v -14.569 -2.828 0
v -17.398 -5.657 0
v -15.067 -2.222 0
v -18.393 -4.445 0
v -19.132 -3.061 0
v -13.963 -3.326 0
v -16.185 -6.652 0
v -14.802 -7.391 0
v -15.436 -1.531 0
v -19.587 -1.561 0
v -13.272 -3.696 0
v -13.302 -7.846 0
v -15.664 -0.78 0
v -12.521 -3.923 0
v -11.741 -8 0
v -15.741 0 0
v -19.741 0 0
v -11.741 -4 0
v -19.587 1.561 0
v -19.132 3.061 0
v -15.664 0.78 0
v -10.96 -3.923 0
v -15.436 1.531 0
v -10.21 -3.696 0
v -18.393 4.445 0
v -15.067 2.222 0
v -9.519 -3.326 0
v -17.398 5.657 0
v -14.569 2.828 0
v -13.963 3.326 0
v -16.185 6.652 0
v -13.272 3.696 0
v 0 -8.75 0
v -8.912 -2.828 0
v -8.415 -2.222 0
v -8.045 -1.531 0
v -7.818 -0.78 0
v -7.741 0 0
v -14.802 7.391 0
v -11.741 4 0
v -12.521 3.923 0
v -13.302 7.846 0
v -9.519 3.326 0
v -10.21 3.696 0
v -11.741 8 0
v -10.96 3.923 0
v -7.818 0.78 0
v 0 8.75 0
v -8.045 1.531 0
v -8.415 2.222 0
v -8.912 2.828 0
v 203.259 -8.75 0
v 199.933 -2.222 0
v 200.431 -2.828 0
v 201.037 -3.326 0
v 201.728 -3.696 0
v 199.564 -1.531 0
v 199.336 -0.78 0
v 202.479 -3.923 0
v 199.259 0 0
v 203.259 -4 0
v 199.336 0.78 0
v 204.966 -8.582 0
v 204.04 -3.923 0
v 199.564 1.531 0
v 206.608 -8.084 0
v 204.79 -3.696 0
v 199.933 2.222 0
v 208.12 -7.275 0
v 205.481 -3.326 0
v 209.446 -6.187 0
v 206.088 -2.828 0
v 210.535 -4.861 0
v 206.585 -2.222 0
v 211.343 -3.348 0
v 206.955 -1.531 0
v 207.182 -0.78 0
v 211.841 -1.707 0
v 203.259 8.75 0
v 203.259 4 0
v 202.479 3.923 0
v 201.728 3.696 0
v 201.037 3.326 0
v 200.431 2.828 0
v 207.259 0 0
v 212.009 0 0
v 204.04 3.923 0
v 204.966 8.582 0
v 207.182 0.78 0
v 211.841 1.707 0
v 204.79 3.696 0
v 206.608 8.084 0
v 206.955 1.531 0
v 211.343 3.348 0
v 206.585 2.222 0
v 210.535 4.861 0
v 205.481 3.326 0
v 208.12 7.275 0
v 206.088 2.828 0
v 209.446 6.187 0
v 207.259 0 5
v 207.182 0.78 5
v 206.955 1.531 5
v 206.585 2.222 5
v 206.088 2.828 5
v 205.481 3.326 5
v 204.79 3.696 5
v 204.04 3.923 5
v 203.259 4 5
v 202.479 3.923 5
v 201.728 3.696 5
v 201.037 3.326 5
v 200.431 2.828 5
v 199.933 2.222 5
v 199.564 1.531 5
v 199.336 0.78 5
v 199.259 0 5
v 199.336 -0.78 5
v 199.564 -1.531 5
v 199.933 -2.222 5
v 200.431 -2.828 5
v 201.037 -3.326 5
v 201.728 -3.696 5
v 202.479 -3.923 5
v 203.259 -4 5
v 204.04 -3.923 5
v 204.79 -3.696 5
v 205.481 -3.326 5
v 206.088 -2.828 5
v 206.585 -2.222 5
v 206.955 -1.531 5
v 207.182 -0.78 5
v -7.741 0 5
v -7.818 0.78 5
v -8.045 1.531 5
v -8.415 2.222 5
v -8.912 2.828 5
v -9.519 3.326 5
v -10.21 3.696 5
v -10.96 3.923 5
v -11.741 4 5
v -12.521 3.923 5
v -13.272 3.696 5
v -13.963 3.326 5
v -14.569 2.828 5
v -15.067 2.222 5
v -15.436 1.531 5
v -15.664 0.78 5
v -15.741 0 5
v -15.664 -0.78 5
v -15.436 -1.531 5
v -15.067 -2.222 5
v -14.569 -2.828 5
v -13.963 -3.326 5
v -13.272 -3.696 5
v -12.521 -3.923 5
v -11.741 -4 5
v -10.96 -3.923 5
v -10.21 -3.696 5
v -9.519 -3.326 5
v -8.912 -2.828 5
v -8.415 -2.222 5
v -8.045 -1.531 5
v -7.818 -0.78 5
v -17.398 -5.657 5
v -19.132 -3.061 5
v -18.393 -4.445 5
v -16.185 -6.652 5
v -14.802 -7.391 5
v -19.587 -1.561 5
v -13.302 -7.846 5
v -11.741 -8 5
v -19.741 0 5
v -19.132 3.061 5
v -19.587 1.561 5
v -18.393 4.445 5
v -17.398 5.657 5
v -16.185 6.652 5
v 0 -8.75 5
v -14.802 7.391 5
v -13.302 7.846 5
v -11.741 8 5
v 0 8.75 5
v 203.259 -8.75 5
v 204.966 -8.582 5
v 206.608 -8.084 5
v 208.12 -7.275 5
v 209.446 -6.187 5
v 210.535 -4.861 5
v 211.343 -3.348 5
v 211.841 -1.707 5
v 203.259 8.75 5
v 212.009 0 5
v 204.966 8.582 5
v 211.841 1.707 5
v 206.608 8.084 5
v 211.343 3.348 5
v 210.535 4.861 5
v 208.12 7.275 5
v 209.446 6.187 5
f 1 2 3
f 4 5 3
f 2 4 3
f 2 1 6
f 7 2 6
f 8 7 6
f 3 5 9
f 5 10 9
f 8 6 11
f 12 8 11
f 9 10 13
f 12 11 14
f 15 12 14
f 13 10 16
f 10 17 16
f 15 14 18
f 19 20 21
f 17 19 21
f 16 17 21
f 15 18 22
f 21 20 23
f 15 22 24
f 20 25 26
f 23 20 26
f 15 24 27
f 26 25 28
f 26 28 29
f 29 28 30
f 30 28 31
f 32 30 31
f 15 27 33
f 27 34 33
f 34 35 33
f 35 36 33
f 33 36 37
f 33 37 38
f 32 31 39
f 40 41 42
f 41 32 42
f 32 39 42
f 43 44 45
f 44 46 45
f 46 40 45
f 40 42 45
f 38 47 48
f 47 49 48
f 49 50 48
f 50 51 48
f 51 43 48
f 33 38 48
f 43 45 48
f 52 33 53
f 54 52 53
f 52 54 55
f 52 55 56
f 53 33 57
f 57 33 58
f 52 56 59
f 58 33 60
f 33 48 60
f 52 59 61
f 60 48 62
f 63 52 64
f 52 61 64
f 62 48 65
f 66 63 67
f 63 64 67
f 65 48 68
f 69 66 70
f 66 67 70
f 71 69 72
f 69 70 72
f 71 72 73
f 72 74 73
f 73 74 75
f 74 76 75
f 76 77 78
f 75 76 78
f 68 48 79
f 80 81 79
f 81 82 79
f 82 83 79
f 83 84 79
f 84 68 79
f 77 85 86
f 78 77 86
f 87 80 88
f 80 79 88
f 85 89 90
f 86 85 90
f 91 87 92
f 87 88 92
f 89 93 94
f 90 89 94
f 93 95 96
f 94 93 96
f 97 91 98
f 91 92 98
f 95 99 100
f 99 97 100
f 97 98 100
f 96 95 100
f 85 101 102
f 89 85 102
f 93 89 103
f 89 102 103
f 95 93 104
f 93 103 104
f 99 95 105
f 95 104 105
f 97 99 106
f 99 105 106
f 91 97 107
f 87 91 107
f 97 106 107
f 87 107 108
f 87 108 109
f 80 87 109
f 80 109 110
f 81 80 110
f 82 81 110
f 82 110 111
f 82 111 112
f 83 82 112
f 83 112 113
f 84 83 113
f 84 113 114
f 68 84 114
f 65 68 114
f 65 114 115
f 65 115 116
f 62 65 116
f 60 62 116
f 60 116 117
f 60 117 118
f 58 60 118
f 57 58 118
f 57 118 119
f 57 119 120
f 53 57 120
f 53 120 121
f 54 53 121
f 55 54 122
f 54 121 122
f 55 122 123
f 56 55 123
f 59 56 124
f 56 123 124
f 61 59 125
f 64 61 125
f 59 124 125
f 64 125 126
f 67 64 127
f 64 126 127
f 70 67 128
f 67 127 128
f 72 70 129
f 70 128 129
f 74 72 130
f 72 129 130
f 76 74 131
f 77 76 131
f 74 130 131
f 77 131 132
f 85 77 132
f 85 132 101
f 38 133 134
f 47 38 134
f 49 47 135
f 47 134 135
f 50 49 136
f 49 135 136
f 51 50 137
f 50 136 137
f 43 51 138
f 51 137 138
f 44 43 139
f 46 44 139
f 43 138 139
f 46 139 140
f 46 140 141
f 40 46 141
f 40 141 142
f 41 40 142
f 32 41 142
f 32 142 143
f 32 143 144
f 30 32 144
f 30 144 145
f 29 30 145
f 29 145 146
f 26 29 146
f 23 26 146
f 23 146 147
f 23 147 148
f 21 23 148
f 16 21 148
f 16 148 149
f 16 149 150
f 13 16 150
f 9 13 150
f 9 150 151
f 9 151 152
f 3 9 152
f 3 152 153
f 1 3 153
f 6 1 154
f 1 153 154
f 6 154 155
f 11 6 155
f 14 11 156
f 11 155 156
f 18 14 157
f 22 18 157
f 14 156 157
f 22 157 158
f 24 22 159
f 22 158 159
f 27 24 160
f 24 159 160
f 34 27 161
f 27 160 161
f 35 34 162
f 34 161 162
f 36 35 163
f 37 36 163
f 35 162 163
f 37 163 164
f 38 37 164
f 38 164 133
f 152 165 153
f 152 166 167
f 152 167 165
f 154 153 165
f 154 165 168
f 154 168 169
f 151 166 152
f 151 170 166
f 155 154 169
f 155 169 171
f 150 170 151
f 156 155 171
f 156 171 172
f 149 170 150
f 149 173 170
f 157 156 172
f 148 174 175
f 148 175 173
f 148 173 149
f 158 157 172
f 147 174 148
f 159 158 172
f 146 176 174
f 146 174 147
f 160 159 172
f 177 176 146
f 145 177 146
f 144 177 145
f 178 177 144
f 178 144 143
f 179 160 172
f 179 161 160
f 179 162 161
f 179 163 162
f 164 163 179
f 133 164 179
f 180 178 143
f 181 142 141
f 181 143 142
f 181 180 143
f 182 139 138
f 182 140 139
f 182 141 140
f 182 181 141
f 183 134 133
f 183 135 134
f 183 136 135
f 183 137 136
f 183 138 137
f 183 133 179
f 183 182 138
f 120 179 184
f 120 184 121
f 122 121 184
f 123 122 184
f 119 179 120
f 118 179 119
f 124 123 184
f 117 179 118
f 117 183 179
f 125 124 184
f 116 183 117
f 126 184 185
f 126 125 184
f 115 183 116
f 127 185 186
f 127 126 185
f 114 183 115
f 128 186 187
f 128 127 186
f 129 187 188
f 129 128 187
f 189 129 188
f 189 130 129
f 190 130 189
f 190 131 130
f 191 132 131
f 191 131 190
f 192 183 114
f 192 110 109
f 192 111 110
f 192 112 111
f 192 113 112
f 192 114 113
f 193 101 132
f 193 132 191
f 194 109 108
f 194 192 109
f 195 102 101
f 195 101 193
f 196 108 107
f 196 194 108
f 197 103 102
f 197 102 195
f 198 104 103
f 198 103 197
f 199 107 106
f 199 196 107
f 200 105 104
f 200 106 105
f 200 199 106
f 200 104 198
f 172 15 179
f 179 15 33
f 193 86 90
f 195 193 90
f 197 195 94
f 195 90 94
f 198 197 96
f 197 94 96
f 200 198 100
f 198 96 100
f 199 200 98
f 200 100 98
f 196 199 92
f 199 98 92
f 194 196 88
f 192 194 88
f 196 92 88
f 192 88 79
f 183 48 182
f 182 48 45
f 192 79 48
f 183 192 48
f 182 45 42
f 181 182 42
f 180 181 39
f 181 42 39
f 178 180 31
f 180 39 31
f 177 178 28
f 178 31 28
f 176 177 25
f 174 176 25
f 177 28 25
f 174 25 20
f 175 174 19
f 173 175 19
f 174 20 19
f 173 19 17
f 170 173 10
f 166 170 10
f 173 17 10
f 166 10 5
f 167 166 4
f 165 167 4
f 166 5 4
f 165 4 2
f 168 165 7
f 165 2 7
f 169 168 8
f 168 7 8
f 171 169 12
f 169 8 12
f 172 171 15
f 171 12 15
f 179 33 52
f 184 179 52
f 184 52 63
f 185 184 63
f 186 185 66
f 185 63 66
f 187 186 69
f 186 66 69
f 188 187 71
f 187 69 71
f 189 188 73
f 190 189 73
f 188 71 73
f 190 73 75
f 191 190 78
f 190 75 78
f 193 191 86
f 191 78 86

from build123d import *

# Parameters (mm, degrees)
SKETCH_3_R          = 8
EXTRUDE_1_DEPTH     = 5
SKETCH_4_R          = 4
CUT_EXTRUDE_1_DEPTH = 213.248558243


with BuildPart() as part:
    # 草图3 → 凸台-拉伸1 (new body)
    with BuildSketch(Plane.XY):
        with BuildLine():
            ThreePointArc((203.259167971, -8.750002099), (194.509167971, -2.099e-06), (203.259167971, 8.749997901))
            Line((203.259167971, 8.749997901), (0, 8.749997901))
            Line((0, 8.749997901), (-11.740832029, 8))
            ThreePointArc((-11.740832029, 8), (-6.08397778, 5.656854249), (-3.740832029, 0))
            ThreePointArc((-3.740832029, 0), (-6.08397778, -5.656854249), (-11.740832029, -8))
            Line((-11.740832029, -8), (0, -8.750038444))
            Line((0, -8.750038444), (203.259167971, -8.750002099))
        make_face()
        with Locations((-11.740832029, 0)):
            Circle(SKETCH_3_R)
        with BuildLine():
            ThreePointArc((212.009167971, -2.099e-06), (209.446352306, 6.187182236), (203.259167971, 8.749997901))
            Line((203.259167971, 8.749997901), (203.259167971, -8.750002099))
            ThreePointArc((203.259167971, -8.750002099), (209.446352306, -6.187186435), (212.009167971, -2.099e-06))
        make_face()
        with BuildLine():
            Line((203.259167971, -8.750002099), (203.259167971, 8.749997901))
            ThreePointArc((203.259167971, 8.749997901), (194.509167971, -2.099e-06), (203.259167971, -8.750002099))
        make_face()
    extrude(amount=EXTRUDE_1_DEPTH)

    # 草图4 → 切除-拉伸1 (cut, through all)
    with BuildSketch(Plane.XY.offset(5)):
        with Locations((-11.740832029, 0)):
            Circle(SKETCH_4_R)
        with Locations((203.259167971, -2.099e-06)):
            Circle(SKETCH_4_R)
    extrude(amount=-CUT_EXTRUDE_1_DEPTH, mode=Mode.SUBTRACT)


solid = part.part
